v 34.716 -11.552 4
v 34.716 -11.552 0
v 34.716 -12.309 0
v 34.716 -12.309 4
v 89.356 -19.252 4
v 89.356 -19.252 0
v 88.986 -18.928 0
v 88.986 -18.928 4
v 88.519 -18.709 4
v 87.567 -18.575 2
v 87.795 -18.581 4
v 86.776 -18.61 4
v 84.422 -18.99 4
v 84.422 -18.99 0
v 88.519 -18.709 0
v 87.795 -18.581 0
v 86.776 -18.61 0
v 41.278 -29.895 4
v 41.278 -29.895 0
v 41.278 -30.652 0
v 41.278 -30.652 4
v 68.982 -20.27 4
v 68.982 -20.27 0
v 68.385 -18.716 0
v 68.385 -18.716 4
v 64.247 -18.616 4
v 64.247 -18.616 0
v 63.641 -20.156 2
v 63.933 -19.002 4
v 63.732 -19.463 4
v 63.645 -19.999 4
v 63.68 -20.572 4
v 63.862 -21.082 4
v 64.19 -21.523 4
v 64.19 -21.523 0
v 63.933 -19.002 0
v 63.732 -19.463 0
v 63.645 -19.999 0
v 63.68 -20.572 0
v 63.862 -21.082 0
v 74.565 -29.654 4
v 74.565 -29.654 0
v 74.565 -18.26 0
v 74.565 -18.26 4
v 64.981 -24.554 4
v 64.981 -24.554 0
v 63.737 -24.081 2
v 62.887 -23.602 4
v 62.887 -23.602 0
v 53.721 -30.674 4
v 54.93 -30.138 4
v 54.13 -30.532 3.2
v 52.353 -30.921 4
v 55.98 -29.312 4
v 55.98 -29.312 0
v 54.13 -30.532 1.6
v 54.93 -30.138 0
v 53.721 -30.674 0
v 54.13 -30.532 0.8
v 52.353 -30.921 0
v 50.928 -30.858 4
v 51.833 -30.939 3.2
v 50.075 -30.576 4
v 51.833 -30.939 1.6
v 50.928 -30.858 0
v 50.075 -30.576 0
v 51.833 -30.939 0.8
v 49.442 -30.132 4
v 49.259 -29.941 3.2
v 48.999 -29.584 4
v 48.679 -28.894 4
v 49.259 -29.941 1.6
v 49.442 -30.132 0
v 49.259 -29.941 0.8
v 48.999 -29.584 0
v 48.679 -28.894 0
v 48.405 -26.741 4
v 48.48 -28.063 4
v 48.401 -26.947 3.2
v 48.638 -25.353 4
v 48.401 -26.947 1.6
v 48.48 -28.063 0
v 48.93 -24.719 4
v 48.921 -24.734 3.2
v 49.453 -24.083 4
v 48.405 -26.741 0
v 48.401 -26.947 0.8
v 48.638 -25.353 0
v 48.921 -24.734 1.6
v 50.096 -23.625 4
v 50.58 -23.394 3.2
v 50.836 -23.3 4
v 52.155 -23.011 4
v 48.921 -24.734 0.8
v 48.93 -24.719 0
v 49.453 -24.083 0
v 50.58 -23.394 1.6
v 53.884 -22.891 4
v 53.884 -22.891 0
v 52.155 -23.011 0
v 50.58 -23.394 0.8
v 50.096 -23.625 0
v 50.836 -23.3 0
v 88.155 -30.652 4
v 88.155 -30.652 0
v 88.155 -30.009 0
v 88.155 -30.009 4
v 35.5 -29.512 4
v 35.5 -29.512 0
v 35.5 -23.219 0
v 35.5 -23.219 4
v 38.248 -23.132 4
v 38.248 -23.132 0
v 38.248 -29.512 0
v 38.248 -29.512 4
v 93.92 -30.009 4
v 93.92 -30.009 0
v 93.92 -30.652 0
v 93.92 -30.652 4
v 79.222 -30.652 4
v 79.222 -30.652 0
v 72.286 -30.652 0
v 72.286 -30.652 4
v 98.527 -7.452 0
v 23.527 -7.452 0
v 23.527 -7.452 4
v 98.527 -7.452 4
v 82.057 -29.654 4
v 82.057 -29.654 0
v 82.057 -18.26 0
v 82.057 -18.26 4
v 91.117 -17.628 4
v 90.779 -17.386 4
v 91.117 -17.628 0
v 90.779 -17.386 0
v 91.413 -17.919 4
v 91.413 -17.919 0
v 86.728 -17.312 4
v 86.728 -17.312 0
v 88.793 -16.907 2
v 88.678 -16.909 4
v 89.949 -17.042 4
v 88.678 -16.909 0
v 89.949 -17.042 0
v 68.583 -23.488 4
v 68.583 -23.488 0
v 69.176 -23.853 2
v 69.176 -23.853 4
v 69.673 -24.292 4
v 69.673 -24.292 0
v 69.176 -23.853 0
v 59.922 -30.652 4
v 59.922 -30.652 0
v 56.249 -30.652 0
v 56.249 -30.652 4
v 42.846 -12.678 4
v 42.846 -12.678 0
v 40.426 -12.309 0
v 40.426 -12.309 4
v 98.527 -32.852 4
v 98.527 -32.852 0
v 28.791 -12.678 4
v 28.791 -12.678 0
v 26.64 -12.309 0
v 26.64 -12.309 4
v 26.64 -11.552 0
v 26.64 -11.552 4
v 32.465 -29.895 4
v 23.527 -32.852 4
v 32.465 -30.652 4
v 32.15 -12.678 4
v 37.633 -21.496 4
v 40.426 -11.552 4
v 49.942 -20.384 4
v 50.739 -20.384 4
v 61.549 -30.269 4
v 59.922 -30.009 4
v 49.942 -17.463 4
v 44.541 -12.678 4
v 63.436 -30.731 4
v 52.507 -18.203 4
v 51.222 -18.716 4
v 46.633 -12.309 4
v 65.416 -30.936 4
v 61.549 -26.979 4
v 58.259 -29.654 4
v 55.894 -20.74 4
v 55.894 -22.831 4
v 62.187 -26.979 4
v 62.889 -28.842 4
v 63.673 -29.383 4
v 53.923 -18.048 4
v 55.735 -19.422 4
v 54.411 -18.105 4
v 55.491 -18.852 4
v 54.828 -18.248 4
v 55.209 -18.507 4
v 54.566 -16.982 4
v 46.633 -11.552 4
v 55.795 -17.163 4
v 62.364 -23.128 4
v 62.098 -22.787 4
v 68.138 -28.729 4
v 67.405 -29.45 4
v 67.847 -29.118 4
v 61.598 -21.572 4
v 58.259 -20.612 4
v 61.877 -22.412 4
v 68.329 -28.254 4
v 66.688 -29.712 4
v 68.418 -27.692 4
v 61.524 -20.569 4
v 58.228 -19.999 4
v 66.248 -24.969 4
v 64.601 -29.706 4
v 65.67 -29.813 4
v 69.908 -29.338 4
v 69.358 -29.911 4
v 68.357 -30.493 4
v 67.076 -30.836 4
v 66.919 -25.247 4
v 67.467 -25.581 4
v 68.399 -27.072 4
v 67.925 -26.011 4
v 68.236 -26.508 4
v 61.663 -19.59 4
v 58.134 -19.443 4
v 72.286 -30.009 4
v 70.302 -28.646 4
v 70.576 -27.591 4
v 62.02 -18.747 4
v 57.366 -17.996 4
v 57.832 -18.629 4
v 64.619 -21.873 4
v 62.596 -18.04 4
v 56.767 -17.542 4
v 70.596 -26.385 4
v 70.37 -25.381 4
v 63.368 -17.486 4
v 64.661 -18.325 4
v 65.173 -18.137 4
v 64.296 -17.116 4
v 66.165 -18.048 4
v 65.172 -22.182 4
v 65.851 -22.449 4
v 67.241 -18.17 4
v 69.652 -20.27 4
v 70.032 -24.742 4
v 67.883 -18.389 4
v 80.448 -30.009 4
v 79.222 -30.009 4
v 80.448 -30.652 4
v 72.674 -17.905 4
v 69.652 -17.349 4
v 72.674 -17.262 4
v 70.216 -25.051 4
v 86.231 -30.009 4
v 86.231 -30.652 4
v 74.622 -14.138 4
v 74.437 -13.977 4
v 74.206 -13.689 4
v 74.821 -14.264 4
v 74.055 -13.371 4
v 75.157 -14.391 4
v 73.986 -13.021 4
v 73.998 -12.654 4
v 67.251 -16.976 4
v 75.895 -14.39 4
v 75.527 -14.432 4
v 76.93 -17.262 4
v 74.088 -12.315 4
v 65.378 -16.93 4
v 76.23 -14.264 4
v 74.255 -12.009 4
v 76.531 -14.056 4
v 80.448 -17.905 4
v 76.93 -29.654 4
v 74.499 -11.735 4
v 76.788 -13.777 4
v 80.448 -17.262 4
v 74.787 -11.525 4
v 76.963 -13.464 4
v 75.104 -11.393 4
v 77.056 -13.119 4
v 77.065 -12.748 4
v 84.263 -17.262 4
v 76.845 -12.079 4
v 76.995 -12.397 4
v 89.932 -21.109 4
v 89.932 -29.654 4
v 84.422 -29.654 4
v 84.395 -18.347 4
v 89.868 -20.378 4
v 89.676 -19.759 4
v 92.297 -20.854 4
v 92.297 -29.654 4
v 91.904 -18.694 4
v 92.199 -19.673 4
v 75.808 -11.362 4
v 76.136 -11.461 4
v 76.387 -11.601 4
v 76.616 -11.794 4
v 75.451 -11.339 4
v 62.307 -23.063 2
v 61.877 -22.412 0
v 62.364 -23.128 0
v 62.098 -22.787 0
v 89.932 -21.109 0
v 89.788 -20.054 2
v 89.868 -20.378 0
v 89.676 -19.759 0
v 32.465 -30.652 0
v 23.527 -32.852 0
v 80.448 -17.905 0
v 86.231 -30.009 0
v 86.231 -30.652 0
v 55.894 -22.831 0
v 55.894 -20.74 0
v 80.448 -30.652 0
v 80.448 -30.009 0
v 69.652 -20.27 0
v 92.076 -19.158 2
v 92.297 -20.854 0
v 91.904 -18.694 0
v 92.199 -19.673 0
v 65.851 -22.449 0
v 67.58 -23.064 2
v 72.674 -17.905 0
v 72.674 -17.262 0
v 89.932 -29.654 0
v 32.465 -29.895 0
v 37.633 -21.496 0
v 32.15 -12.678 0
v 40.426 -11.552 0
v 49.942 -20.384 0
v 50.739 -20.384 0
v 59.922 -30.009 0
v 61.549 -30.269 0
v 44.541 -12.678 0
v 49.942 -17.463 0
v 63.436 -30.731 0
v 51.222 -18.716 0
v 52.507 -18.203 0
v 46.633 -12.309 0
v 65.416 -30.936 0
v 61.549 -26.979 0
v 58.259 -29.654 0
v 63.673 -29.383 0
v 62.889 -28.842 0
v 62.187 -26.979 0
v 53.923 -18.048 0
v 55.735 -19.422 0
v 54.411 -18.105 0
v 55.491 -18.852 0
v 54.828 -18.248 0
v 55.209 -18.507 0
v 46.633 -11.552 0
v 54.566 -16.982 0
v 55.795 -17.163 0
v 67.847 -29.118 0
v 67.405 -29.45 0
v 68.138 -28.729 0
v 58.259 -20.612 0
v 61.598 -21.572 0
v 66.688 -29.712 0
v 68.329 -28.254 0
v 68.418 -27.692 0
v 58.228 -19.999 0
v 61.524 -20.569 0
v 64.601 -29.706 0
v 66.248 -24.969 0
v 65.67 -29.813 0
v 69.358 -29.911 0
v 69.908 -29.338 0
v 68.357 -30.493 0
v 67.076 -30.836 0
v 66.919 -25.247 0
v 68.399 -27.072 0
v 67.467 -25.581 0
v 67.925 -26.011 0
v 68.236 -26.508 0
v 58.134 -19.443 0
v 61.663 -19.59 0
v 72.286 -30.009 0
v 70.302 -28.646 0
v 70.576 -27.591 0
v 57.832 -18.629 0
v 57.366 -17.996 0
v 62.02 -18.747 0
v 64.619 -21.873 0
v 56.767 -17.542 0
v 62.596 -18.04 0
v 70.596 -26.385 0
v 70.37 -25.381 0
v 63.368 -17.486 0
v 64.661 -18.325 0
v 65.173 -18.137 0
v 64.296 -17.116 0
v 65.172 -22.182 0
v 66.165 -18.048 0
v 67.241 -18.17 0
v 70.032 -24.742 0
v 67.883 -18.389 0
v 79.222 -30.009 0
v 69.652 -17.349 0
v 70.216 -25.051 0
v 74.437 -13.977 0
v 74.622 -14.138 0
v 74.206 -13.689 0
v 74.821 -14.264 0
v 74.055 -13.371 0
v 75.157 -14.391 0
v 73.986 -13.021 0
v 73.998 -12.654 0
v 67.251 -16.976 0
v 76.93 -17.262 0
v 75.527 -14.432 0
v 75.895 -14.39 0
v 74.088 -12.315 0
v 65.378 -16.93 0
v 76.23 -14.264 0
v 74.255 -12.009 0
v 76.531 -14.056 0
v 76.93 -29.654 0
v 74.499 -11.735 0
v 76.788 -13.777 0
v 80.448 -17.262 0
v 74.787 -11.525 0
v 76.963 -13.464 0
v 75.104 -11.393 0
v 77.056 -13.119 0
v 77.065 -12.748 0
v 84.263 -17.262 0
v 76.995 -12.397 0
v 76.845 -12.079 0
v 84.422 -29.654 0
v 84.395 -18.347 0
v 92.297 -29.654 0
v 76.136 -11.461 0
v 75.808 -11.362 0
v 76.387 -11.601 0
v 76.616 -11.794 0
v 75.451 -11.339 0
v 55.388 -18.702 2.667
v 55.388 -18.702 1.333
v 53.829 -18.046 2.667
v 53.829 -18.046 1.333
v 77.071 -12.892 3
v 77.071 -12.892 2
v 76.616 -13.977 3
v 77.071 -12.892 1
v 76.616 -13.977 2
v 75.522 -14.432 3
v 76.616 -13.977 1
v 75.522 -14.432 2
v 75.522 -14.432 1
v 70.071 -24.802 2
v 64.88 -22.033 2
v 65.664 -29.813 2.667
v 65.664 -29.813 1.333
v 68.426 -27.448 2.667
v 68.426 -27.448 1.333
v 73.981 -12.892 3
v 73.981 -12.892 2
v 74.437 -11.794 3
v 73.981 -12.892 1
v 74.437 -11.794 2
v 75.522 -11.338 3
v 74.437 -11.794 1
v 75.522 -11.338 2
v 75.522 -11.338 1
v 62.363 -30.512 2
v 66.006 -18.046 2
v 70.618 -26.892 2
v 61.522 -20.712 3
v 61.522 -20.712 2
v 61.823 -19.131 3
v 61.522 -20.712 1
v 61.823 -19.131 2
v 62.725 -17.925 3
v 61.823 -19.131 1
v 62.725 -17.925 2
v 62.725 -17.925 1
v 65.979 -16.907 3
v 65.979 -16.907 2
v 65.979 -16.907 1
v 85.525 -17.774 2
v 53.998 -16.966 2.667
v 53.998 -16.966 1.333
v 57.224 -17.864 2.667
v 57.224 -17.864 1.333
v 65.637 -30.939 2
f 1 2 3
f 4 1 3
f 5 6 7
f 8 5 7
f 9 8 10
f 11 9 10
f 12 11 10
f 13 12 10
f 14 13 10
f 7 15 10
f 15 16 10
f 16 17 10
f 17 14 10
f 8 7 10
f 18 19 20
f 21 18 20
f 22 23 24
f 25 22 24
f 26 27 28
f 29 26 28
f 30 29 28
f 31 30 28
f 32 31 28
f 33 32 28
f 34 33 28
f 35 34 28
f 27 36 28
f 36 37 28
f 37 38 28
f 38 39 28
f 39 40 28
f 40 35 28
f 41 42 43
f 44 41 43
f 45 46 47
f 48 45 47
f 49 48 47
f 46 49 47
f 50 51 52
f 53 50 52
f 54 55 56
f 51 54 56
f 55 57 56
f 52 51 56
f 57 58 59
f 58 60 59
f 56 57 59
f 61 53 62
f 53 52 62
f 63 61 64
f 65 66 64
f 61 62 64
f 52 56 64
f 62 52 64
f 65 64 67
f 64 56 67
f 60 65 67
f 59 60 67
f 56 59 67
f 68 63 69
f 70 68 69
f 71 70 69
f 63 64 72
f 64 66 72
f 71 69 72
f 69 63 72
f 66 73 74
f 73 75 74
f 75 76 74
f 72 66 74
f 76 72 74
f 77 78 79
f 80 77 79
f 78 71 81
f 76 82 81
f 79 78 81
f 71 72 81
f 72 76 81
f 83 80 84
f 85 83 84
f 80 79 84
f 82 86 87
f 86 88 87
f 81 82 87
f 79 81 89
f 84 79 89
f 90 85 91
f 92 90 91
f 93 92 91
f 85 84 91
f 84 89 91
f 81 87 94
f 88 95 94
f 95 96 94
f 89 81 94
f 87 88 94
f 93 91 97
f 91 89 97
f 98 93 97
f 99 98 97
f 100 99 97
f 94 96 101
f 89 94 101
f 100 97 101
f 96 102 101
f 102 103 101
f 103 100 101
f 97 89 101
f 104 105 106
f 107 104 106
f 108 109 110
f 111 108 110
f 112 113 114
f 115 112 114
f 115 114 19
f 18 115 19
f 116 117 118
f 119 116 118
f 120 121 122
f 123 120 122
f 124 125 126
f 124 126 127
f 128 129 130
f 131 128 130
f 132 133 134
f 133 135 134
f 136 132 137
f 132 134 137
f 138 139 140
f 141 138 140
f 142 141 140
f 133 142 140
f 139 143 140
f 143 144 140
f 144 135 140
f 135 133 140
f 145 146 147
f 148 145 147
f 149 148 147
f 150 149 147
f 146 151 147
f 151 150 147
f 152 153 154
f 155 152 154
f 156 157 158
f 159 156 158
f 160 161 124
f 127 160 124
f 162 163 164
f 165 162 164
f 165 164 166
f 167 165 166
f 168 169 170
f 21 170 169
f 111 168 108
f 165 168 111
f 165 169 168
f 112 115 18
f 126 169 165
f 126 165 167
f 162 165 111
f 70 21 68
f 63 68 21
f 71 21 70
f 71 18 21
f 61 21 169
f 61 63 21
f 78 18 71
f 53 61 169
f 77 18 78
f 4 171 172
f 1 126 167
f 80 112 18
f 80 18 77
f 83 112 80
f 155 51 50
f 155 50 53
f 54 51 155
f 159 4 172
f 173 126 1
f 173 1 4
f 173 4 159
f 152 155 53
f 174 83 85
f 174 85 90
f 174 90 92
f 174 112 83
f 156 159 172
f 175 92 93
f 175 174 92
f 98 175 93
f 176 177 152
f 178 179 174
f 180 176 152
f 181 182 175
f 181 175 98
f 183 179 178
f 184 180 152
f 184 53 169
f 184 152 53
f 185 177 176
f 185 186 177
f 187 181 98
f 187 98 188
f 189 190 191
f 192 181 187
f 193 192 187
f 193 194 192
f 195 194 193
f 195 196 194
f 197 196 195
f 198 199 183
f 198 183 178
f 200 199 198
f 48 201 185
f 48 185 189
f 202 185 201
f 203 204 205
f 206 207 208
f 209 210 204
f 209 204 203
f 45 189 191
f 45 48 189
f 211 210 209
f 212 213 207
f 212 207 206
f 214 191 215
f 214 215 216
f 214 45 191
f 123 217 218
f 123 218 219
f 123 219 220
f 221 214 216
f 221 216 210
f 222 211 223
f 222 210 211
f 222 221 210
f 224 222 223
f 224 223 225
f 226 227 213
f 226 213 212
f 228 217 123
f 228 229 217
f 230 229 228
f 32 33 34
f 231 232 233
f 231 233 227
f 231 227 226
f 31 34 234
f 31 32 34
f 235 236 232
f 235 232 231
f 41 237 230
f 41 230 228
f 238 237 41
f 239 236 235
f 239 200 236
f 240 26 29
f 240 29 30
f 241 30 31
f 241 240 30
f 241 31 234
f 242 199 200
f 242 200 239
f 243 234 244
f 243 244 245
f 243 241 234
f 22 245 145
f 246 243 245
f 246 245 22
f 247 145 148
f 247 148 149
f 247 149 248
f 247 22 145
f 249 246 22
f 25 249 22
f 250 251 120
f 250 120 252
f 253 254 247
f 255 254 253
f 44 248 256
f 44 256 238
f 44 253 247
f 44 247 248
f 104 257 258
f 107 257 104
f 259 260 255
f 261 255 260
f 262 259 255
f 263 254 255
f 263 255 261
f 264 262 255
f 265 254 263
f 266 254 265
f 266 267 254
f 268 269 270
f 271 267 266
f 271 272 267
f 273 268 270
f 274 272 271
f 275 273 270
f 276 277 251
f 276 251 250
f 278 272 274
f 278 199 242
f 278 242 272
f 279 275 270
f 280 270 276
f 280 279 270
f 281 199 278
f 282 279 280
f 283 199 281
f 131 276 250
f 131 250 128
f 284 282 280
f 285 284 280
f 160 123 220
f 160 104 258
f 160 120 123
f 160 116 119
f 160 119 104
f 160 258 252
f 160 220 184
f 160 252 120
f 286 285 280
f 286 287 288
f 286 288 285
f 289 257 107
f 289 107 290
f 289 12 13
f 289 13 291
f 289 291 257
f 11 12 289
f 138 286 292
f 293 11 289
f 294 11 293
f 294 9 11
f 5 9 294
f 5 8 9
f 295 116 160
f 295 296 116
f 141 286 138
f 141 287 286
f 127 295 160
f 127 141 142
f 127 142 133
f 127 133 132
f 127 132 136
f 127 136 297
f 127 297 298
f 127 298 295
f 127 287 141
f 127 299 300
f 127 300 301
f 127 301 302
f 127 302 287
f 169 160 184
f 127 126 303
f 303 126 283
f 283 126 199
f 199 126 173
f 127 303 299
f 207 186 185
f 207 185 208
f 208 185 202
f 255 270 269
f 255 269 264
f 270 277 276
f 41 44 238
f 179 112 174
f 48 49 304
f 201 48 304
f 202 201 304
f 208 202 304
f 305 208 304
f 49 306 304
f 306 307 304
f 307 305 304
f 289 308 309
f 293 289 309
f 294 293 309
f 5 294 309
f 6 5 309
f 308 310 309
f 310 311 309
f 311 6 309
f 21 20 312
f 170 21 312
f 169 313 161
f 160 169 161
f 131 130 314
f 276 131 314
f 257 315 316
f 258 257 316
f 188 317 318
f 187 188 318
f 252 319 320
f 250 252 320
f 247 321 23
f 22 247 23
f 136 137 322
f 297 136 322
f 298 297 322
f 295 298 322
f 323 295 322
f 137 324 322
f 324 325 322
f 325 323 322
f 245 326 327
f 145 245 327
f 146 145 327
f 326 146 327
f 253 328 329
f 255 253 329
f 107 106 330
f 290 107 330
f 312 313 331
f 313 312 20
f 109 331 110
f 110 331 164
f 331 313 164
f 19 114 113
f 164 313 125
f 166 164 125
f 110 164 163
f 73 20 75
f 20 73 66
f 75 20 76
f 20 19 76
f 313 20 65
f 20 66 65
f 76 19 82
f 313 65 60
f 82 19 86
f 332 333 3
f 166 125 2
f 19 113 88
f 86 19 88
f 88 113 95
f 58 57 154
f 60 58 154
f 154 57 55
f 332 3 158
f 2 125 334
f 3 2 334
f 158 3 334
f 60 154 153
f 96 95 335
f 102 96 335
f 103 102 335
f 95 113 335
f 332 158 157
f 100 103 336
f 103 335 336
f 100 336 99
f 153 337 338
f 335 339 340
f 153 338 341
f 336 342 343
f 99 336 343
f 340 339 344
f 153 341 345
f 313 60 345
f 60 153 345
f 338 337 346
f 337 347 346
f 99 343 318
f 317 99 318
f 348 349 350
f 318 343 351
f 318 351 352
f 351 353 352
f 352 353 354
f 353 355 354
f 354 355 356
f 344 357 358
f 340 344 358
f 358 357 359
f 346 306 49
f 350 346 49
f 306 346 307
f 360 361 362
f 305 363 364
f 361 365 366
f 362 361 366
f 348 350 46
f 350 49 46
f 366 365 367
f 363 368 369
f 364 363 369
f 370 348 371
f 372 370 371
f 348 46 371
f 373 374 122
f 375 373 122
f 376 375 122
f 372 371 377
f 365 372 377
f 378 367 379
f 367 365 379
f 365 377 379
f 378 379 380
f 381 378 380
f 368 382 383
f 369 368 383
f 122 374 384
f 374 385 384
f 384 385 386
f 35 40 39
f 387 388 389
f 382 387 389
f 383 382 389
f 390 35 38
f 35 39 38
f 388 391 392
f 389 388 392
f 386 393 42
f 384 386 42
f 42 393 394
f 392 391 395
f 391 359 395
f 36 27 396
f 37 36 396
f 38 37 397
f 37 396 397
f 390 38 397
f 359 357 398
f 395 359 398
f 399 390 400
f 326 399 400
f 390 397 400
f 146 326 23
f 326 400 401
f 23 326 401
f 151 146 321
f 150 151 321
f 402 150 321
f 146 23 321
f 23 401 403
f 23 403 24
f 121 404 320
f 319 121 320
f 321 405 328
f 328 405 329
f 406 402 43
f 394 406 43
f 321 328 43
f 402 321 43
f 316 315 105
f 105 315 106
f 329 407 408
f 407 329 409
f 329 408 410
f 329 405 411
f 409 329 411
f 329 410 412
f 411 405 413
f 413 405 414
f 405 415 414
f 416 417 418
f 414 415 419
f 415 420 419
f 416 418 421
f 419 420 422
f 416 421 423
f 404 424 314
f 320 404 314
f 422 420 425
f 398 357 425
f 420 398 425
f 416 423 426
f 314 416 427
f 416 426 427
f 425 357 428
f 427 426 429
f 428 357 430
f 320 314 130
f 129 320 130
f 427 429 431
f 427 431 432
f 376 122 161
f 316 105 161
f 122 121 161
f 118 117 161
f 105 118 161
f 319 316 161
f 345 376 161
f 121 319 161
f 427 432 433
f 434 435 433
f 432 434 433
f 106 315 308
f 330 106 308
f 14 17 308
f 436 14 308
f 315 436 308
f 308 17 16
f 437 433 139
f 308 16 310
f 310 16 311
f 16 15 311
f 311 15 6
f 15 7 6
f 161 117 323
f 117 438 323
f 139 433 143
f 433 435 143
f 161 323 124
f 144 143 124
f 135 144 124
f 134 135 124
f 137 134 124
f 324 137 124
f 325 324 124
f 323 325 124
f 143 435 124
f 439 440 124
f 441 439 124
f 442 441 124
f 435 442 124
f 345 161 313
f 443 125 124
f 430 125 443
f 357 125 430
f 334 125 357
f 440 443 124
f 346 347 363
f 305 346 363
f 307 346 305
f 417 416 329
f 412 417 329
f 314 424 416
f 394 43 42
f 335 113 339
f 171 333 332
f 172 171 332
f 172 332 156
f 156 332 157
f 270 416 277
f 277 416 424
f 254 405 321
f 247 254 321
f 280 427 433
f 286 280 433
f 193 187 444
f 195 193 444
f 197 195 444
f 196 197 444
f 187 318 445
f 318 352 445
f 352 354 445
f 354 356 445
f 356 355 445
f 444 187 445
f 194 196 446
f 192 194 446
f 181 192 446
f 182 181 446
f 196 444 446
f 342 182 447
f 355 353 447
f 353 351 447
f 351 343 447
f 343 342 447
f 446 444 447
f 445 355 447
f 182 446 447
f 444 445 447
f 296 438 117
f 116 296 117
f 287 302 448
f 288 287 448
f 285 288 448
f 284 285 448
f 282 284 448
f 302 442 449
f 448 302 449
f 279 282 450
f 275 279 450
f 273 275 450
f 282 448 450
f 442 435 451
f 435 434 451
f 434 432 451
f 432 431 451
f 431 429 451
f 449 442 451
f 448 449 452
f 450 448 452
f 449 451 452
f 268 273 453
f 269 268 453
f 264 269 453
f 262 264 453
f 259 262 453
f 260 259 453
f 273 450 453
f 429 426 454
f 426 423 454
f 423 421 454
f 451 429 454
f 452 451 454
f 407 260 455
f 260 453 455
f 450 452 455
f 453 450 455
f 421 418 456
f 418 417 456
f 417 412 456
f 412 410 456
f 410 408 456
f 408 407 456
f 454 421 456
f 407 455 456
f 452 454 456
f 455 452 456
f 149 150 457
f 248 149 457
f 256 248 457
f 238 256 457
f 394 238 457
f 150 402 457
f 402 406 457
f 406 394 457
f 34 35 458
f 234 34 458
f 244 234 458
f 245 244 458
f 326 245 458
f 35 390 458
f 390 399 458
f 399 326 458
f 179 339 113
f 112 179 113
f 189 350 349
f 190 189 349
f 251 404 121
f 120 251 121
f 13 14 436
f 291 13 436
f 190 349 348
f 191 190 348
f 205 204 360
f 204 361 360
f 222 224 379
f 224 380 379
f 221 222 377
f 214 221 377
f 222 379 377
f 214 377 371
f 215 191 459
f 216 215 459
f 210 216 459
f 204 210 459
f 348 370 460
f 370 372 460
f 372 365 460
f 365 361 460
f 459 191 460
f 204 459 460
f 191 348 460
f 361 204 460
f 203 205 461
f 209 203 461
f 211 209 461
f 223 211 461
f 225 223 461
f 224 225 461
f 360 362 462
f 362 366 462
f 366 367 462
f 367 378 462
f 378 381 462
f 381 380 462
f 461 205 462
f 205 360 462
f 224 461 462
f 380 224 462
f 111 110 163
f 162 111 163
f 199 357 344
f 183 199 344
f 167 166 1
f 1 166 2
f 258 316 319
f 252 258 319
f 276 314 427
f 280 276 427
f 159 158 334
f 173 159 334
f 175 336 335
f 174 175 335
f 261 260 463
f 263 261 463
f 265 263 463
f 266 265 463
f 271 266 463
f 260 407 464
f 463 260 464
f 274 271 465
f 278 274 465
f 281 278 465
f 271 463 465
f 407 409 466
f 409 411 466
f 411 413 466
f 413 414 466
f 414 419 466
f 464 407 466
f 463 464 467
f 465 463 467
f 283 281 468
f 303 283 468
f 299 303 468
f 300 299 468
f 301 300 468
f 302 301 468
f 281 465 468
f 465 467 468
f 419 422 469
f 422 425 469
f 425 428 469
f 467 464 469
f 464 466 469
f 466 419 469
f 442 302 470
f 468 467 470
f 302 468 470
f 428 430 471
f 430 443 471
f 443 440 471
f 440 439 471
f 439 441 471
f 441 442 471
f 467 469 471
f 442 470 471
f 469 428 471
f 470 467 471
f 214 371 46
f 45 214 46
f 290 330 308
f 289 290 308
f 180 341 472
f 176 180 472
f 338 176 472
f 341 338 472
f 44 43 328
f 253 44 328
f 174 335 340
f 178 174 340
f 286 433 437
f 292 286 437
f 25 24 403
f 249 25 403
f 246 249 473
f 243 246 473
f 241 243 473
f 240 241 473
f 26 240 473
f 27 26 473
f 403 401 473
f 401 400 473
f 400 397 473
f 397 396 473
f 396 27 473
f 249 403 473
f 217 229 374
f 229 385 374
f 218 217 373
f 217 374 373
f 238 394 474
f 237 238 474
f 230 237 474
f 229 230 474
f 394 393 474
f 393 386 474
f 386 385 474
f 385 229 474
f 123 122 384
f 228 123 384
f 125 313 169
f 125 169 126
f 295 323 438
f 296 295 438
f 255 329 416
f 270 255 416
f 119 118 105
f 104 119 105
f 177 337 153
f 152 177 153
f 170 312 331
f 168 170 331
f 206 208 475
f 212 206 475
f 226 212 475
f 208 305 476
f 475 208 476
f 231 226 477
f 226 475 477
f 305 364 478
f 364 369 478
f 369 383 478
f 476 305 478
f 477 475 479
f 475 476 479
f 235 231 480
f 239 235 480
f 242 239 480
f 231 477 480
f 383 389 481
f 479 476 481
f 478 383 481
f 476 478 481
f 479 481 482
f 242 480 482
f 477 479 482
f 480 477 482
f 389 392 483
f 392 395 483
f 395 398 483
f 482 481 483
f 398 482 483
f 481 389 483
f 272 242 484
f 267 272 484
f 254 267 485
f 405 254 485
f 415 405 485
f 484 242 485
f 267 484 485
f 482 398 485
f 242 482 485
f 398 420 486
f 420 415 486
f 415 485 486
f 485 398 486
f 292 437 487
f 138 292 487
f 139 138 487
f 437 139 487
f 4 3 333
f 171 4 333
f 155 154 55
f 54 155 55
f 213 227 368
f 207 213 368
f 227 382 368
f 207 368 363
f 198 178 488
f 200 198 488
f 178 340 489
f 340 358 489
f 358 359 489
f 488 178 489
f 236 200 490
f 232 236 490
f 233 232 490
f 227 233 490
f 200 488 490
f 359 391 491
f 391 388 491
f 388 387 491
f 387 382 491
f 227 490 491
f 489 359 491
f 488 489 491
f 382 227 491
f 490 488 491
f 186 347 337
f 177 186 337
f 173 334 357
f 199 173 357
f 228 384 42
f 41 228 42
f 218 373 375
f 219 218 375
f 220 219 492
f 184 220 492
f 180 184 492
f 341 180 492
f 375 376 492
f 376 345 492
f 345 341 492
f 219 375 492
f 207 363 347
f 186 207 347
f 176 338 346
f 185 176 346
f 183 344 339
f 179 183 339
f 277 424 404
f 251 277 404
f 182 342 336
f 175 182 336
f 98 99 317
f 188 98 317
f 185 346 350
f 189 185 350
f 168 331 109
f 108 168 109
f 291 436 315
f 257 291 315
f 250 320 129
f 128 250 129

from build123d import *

# Parameters (mm, degrees)
F0_W     = 75
F0_H     = 25.4
F1_DEPTH = 4


with BuildPart() as f1:
    # F0 (on Top) → F1 (new body)
    with BuildSketch(Plane.XY):
        with Locations((61.0273839791, -20.1516905552)):
            Rectangle(F0_W, F0_H)
        Polygon((44.541381375, -12.6777322218), (38.2477615833, -23.1321593052), (38.2477615833, -29.5123676385), (41.2783605416, -29.8951801385), (41.2783605416, -30.6516905552), (32.4645584583, -30.6516905552), (32.4645584583, -29.8951801385), (35.4997147083, -29.5123676385), (35.4997147083, -23.2187478468), (28.791381375, -12.6777322218), (26.6403397083, -12.3085915968), (26.6403397083, -11.5520811802), (34.7158605416, -11.5520811802), (34.7158605416, -12.3085915968), (32.1501053333, -12.6777322218), (37.6325272083, -21.4960915968), (42.846068875, -12.6777322218), (40.426147, -12.3085915968), (40.426147, -11.5520811802), (46.63317825, -11.5520811802), (46.63317825, -12.3085915968), align=None, mode=Mode.SUBTRACT)
        with BuildLine():
            add(Edge.make_bspline(
                [(49.941772, -17.4628884718), (52.2477615833, -16.9661436802), (53.9977615833, -16.9661436802)],
                knots=[0, 0, 0, 1, 1, 1], degree=2))
            add(Edge.make_bspline(
                [(53.9977615833, -16.9661436802), (56.189818875, -16.9661436802), (57.2243240833, -17.8639301385)],
                knots=[0, 0, 0, 1, 1, 1], degree=2))
            add(Edge.make_bspline(
                [(57.2243240833, -17.8639301385), (58.2588292916, -18.7617165968), (58.2588292916, -20.6119770135)],
                knots=[0, 0, 0, 1, 1, 1], degree=2))
            Line((58.2588292916, -20.6119770135), (58.2588292916, -29.6536436802))
            Line((58.2588292916, -29.6536436802), (59.92224075, -30.0091124302))
            Line((59.92224075, -30.0091124302), (59.92224075, -30.6516905552))
            Line((59.92224075, -30.6516905552), (56.2490636666, -30.6516905552))
            Line((56.2490636666, -30.6516905552), (55.9801834583, -29.3118468052))
            add(Edge.make_bspline(
                [(55.9801834583, -29.3118468052), (54.3532303333, -30.9387999302), (51.8330480416, -30.9387999302)],
                knots=[0, 0, 0, 1, 1, 1], degree=2))
            add(Edge.make_bspline(
                [(51.8330480416, -30.9387999302), (48.4014074166, -30.9387999302), (48.4014074166, -26.9466124302)],
                knots=[0, 0, 0, 1, 1, 1], degree=2))
            add(Edge.make_bspline(
                [(48.4014074166, -26.9466124302), (48.4014074166, -25.6113259718), (48.9209386666, -24.734047326)],
                knots=[0, 0, 0, 1, 1, 1], degree=2))
            add(Edge.make_bspline(
                [(48.9209386666, -24.734047326), (49.4404699166, -23.8567686802), (50.5797928333, -23.394203576)],
                knots=[0, 0, 0, 1, 1, 1], degree=2))
            add(Edge.make_bspline(
                [(50.5797928333, -23.394203576), (51.71911575, -22.9316384718), (53.8838292916, -22.8906228468)],
                knots=[0, 0, 0, 1, 1, 1], degree=2))
            Line((53.8838292916, -22.8906228468), (55.8935949166, -22.8313780552))
            Line((55.8935949166, -22.8313780552), (55.8935949166, -20.7395811802))
            add(Edge.make_bspline(
                [(55.8935949166, -20.7395811802), (55.8935949166, -19.3587218052), (55.3877355416, -18.7024718052)],
                knots=[0, 0, 0, 1, 1, 1], degree=2))
            add(Edge.make_bspline(
                [(55.3877355416, -18.7024718052), (54.8818761666, -18.0462218052), (53.8291417916, -18.0462218052)],
                knots=[0, 0, 0, 1, 1, 1], degree=2))
            add(Edge.make_bspline(
                [(53.8291417916, -18.0462218052), (52.4027095, -18.0462218052), (51.2223709583, -18.7161436802)],
                knots=[0, 0, 0, 1, 1, 1], degree=2))
            Line((51.2223709583, -18.7161436802), (50.7392980416, -20.3841124302))
            Line((50.7392980416, -20.3841124302), (49.941772, -20.3841124302))
            Line((49.941772, -20.3841124302), (49.941772, -17.4628884718))
        make_face(mode=Mode.SUBTRACT)
        with BuildLine():
            add(Edge.make_bspline(
                [(70.3698318958, -25.3811827427), (70.6182042916, -25.9941384718), (70.6182042916, -26.8919249302)],
                knots=[0, 0, 0, 1, 1, 1], degree=2))
            add(Edge.make_bspline(
                [(70.6182042916, -26.8919249302), (70.6182042916, -28.8834613885), (69.3581131458, -29.9111306593)],
                knots=[0, 0, 0, 1, 1, 1], degree=2))
            add(Edge.make_bspline(
                [(69.3581131458, -29.9111306593), (68.098022, -30.9387999302), (65.6370845, -30.9387999302)],
                knots=[0, 0, 0, 1, 1, 1], degree=2))
            add(Edge.make_bspline(
                [(65.6370845, -30.9387999302), (64.639037625, -30.9387999302), (63.435912625, -30.7314431593)],
                knots=[0, 0, 0, 1, 1, 1], degree=2))
            add(Edge.make_bspline(
                [(63.435912625, -30.7314431593), (62.232787625, -30.5240863885), (61.549193875, -30.2688780552)],
                knots=[0, 0, 0, 1, 1, 1], degree=2))
            Line((61.549193875, -30.2688780552), (61.549193875, -26.9785134718))
            Line((61.549193875, -26.9785134718), (62.1872147083, -26.9785134718))
            Line((62.1872147083, -26.9785134718), (62.889037625, -28.8424457635))
            add(Edge.make_bspline(
                [(62.889037625, -28.8424457635), (63.955443875, -29.8131488885), (65.66442825, -29.8131488885)],
                knots=[0, 0, 0, 1, 1, 1], degree=2))
            add(Edge.make_bspline(
                [(65.66442825, -29.8131488885), (68.426147, -29.8131488885), (68.426147, -27.4479145135)],
                knots=[0, 0, 0, 1, 1, 1], degree=2))
            add(Edge.make_bspline(
                [(68.426147, -27.4479145135), (68.426147, -25.7115863885), (66.2477615833, -24.9687478468)],
                knots=[0, 0, 0, 1, 1, 1], degree=2))
            Line((66.2477615833, -24.9687478468), (64.9808345, -24.5540343052))
            add(Edge.make_bspline(
                [(64.9808345, -24.5540343052), (63.5407303333, -24.0846332635), (62.8867589791, -23.6015603468)],
                knots=[0, 0, 0, 1, 1, 1], degree=2))
            add(Edge.make_bspline(
                [(62.8867589791, -23.6015603468), (62.232787625, -23.1184874302), (61.877318875, -22.4121072218)],
                knots=[0, 0, 0, 1, 1, 1], degree=2))
            add(Edge.make_bspline(
                [(61.877318875, -22.4121072218), (61.521850125, -21.7057270135), (61.521850125, -20.7122374302)],
                knots=[0, 0, 0, 1, 1, 1], degree=2))
            add(Edge.make_bspline(
                [(61.521850125, -20.7122374302), (61.521850125, -18.9440082635), (62.724975125, -17.925453576)],
                knots=[0, 0, 0, 1, 1, 1], degree=2))
            add(Edge.make_bspline(
                [(62.724975125, -17.925453576), (63.928100125, -16.9068988885), (65.978881375, -16.9068988885)],
                knots=[0, 0, 0, 1, 1, 1], degree=2))
            add(Edge.make_bspline(
                [(65.978881375, -16.9068988885), (67.4463292916, -16.9068988885), (69.6520584583, -17.3489561802)],
                knots=[0, 0, 0, 1, 1, 1], degree=2))
            Line((69.6520584583, -17.3489561802), (69.6520584583, -20.2701801385))
            Line((69.6520584583, -20.2701801385), (68.9821365833, -20.2701801385))
            Line((68.9821365833, -20.2701801385), (68.385131375, -18.7161436802))
            add(Edge.make_bspline(
                [(68.385131375, -18.7161436802), (67.6286209583, -18.0462218052), (66.006225125, -18.0462218052)],
                knots=[0, 0, 0, 1, 1, 1], degree=2))
            add(Edge.make_bspline(
                [(66.006225125, -18.0462218052), (64.8532303333, -18.0462218052), (64.2471105416, -18.6158832635)],
                knots=[0, 0, 0, 1, 1, 1], degree=2))
            add(Edge.make_bspline(
                [(64.2471105416, -18.6158832635), (63.64099075, -19.1855447218), (63.64099075, -20.1562478468)],
                knots=[0, 0, 0, 1, 1, 1], degree=2))
            add(Edge.make_bspline(
                [(63.64099075, -20.1562478468), (63.64099075, -20.9674457635), (64.1901443958, -21.5234353468)],
                knots=[0, 0, 0, 1, 1, 1], degree=2))
            add(Edge.make_bspline(
                [(64.1901443958, -21.5234353468), (64.7392980416, -22.0794249302), (65.8512772083, -22.4485655552)],
                knots=[0, 0, 0, 1, 1, 1], degree=2))
            add(Edge.make_bspline(
                [(65.8512772083, -22.4485655552), (67.9430740833, -23.1595030552), (68.5833735625, -23.4876280552)],
                knots=[0, 0, 0, 1, 1, 1], degree=2))
            add(Edge.make_bspline(
                [(68.5833735625, -23.4876280552), (69.2236730416, -23.8157530552), (69.6725662708, -24.2919900343)],
                knots=[0, 0, 0, 1, 1, 1], degree=2))
            add(Edge.make_bspline(
                [(69.6725662708, -24.2919900343), (70.1214595, -24.7682270135), (70.3698318958, -25.3811827427)],
                knots=[0, 0, 0, 1, 1, 1], degree=2))
        make_face(mode=Mode.SUBTRACT)
        Polygon((76.93005325, -17.2623676385), (76.93005325, -29.6536436802), (79.2223709583, -30.0091124302), (79.2223709583, -30.6516905552), (72.2861730416, -30.6516905552), (72.2861730416, -30.0091124302), (74.564818875, -29.6536436802), (74.564818875, -18.2604145135), (72.6735428333, -17.9049457635), (72.6735428333, -17.2623676385), align=None, mode=Mode.SUBTRACT)
        with BuildLine():
            Line((84.2627355416, -17.2623676385), (84.394897, -18.3470030552))
            add(Edge.make_bspline(
                [(84.394897, -18.3470030552), (85.488647, -17.7180968052), (86.7282303333, -17.3124978468)],
                knots=[0, 0, 0, 1, 1, 1], degree=2))
            add(Edge.make_bspline(
                [(86.7282303333, -17.3124978468), (87.9678136666, -16.9068988885), (88.7926834583, -16.9068988885)],
                knots=[0, 0, 0, 1, 1, 1], degree=2))
            add(Edge.make_bspline(
                [(88.7926834583, -16.9068988885), (90.5290115833, -16.9068988885), (91.4131261666, -17.9186176385)],
                knots=[0, 0, 0, 1, 1, 1], degree=2))
            add(Edge.make_bspline(
                [(91.4131261666, -17.9186176385), (92.29724075, -18.9303363885), (92.29724075, -20.8535134718)],
                knots=[0, 0, 0, 1, 1, 1], degree=2))
            Line((92.29724075, -20.8535134718), (92.29724075, -29.6536436802))
            Line((92.29724075, -29.6536436802), (93.9196365833, -30.0091124302))
            Line((93.9196365833, -30.0091124302), (93.9196365833, -30.6516905552))
            Line((93.9196365833, -30.6516905552), (88.154662625, -30.6516905552))
            Line((88.154662625, -30.6516905552), (88.154662625, -30.0091124302))
            Line((88.154662625, -30.0091124302), (89.932006375, -29.6536436802))
            Line((89.932006375, -29.6536436802), (89.932006375, -21.1087218052))
            add(Edge.make_bspline(
                [(89.932006375, -21.1087218052), (89.932006375, -19.9283832635), (89.3555089791, -19.251625451)],
                knots=[0, 0, 0, 1, 1, 1], degree=2))
            add(Edge.make_bspline(
                [(89.3555089791, -19.251625451), (88.7790115833, -18.5748676385), (87.566772, -18.5748676385)],
                knots=[0, 0, 0, 1, 1, 1], degree=2))
            add(Edge.make_bspline(
                [(87.566772, -18.5748676385), (86.2861730416, -18.5748676385), (84.42224075, -18.9895811802)],
                knots=[0, 0, 0, 1, 1, 1], degree=2))
            Line((84.42224075, -18.9895811802), (84.42224075, -29.6536436802))
            Line((84.42224075, -29.6536436802), (86.2314855416, -30.0091124302))
            Line((86.2314855416, -30.0091124302), (86.2314855416, -30.6516905552))
            Line((86.2314855416, -30.6516905552), (80.4482824166, -30.6516905552))
            Line((80.4482824166, -30.6516905552), (80.4482824166, -30.0091124302))
            Line((80.4482824166, -30.0091124302), (82.057006375, -29.6536436802))
            Line((82.057006375, -29.6536436802), (82.057006375, -18.2604145135))
            Line((82.057006375, -18.2604145135), (80.4482824166, -17.9049457635))
            Line((80.4482824166, -17.9049457635), (80.4482824166, -17.2623676385))
            Line((80.4482824166, -17.2623676385), (84.2627355416, -17.2623676385))
        make_face(mode=Mode.SUBTRACT)
        with BuildLine():
            add(Edge.make_bspline(
                [(76.615600125, -11.7936176385), (77.0713292916, -12.2493468052), (77.0713292916, -12.8919249302)],
                knots=[0, 0, 0, 1, 1, 1], degree=2))
            add(Edge.make_bspline(
                [(77.0713292916, -12.8919249302), (77.0713292916, -13.5208311802), (76.615600125, -13.9765603468)],
                knots=[0, 0, 0, 1, 1, 1], degree=2))
            add(Edge.make_bspline(
                [(76.615600125, -13.9765603468), (76.1598709583, -14.4322895135), (75.521850125, -14.4322895135)],
                knots=[0, 0, 0, 1, 1, 1], degree=2))
            add(Edge.make_bspline(
                [(75.521850125, -14.4322895135), (74.892943875, -14.4322895135), (74.4372147083, -13.9765603468)],
                knots=[0, 0, 0, 1, 1, 1], degree=2))
            add(Edge.make_bspline(
                [(74.4372147083, -13.9765603468), (73.9814855416, -13.5208311802), (73.9814855416, -12.8919249302)],
                knots=[0, 0, 0, 1, 1, 1], degree=2))
            add(Edge.make_bspline(
                [(73.9814855416, -12.8919249302), (73.9814855416, -12.2493468052), (74.4372147083, -11.7936176385)],
                knots=[0, 0, 0, 1, 1, 1], degree=2))
            add(Edge.make_bspline(
                [(74.4372147083, -11.7936176385), (74.892943875, -11.3378884718), (75.521850125, -11.3378884718)],
                knots=[0, 0, 0, 1, 1, 1], degree=2))
            add(Edge.make_bspline(
                [(75.521850125, -11.3378884718), (76.1598709583, -11.3378884718), (76.615600125, -11.7936176385)],
                knots=[0, 0, 0, 1, 1, 1], degree=2))
        make_face(mode=Mode.SUBTRACT)
    extrude(amount=F1_DEPTH)


solid = f1.part
